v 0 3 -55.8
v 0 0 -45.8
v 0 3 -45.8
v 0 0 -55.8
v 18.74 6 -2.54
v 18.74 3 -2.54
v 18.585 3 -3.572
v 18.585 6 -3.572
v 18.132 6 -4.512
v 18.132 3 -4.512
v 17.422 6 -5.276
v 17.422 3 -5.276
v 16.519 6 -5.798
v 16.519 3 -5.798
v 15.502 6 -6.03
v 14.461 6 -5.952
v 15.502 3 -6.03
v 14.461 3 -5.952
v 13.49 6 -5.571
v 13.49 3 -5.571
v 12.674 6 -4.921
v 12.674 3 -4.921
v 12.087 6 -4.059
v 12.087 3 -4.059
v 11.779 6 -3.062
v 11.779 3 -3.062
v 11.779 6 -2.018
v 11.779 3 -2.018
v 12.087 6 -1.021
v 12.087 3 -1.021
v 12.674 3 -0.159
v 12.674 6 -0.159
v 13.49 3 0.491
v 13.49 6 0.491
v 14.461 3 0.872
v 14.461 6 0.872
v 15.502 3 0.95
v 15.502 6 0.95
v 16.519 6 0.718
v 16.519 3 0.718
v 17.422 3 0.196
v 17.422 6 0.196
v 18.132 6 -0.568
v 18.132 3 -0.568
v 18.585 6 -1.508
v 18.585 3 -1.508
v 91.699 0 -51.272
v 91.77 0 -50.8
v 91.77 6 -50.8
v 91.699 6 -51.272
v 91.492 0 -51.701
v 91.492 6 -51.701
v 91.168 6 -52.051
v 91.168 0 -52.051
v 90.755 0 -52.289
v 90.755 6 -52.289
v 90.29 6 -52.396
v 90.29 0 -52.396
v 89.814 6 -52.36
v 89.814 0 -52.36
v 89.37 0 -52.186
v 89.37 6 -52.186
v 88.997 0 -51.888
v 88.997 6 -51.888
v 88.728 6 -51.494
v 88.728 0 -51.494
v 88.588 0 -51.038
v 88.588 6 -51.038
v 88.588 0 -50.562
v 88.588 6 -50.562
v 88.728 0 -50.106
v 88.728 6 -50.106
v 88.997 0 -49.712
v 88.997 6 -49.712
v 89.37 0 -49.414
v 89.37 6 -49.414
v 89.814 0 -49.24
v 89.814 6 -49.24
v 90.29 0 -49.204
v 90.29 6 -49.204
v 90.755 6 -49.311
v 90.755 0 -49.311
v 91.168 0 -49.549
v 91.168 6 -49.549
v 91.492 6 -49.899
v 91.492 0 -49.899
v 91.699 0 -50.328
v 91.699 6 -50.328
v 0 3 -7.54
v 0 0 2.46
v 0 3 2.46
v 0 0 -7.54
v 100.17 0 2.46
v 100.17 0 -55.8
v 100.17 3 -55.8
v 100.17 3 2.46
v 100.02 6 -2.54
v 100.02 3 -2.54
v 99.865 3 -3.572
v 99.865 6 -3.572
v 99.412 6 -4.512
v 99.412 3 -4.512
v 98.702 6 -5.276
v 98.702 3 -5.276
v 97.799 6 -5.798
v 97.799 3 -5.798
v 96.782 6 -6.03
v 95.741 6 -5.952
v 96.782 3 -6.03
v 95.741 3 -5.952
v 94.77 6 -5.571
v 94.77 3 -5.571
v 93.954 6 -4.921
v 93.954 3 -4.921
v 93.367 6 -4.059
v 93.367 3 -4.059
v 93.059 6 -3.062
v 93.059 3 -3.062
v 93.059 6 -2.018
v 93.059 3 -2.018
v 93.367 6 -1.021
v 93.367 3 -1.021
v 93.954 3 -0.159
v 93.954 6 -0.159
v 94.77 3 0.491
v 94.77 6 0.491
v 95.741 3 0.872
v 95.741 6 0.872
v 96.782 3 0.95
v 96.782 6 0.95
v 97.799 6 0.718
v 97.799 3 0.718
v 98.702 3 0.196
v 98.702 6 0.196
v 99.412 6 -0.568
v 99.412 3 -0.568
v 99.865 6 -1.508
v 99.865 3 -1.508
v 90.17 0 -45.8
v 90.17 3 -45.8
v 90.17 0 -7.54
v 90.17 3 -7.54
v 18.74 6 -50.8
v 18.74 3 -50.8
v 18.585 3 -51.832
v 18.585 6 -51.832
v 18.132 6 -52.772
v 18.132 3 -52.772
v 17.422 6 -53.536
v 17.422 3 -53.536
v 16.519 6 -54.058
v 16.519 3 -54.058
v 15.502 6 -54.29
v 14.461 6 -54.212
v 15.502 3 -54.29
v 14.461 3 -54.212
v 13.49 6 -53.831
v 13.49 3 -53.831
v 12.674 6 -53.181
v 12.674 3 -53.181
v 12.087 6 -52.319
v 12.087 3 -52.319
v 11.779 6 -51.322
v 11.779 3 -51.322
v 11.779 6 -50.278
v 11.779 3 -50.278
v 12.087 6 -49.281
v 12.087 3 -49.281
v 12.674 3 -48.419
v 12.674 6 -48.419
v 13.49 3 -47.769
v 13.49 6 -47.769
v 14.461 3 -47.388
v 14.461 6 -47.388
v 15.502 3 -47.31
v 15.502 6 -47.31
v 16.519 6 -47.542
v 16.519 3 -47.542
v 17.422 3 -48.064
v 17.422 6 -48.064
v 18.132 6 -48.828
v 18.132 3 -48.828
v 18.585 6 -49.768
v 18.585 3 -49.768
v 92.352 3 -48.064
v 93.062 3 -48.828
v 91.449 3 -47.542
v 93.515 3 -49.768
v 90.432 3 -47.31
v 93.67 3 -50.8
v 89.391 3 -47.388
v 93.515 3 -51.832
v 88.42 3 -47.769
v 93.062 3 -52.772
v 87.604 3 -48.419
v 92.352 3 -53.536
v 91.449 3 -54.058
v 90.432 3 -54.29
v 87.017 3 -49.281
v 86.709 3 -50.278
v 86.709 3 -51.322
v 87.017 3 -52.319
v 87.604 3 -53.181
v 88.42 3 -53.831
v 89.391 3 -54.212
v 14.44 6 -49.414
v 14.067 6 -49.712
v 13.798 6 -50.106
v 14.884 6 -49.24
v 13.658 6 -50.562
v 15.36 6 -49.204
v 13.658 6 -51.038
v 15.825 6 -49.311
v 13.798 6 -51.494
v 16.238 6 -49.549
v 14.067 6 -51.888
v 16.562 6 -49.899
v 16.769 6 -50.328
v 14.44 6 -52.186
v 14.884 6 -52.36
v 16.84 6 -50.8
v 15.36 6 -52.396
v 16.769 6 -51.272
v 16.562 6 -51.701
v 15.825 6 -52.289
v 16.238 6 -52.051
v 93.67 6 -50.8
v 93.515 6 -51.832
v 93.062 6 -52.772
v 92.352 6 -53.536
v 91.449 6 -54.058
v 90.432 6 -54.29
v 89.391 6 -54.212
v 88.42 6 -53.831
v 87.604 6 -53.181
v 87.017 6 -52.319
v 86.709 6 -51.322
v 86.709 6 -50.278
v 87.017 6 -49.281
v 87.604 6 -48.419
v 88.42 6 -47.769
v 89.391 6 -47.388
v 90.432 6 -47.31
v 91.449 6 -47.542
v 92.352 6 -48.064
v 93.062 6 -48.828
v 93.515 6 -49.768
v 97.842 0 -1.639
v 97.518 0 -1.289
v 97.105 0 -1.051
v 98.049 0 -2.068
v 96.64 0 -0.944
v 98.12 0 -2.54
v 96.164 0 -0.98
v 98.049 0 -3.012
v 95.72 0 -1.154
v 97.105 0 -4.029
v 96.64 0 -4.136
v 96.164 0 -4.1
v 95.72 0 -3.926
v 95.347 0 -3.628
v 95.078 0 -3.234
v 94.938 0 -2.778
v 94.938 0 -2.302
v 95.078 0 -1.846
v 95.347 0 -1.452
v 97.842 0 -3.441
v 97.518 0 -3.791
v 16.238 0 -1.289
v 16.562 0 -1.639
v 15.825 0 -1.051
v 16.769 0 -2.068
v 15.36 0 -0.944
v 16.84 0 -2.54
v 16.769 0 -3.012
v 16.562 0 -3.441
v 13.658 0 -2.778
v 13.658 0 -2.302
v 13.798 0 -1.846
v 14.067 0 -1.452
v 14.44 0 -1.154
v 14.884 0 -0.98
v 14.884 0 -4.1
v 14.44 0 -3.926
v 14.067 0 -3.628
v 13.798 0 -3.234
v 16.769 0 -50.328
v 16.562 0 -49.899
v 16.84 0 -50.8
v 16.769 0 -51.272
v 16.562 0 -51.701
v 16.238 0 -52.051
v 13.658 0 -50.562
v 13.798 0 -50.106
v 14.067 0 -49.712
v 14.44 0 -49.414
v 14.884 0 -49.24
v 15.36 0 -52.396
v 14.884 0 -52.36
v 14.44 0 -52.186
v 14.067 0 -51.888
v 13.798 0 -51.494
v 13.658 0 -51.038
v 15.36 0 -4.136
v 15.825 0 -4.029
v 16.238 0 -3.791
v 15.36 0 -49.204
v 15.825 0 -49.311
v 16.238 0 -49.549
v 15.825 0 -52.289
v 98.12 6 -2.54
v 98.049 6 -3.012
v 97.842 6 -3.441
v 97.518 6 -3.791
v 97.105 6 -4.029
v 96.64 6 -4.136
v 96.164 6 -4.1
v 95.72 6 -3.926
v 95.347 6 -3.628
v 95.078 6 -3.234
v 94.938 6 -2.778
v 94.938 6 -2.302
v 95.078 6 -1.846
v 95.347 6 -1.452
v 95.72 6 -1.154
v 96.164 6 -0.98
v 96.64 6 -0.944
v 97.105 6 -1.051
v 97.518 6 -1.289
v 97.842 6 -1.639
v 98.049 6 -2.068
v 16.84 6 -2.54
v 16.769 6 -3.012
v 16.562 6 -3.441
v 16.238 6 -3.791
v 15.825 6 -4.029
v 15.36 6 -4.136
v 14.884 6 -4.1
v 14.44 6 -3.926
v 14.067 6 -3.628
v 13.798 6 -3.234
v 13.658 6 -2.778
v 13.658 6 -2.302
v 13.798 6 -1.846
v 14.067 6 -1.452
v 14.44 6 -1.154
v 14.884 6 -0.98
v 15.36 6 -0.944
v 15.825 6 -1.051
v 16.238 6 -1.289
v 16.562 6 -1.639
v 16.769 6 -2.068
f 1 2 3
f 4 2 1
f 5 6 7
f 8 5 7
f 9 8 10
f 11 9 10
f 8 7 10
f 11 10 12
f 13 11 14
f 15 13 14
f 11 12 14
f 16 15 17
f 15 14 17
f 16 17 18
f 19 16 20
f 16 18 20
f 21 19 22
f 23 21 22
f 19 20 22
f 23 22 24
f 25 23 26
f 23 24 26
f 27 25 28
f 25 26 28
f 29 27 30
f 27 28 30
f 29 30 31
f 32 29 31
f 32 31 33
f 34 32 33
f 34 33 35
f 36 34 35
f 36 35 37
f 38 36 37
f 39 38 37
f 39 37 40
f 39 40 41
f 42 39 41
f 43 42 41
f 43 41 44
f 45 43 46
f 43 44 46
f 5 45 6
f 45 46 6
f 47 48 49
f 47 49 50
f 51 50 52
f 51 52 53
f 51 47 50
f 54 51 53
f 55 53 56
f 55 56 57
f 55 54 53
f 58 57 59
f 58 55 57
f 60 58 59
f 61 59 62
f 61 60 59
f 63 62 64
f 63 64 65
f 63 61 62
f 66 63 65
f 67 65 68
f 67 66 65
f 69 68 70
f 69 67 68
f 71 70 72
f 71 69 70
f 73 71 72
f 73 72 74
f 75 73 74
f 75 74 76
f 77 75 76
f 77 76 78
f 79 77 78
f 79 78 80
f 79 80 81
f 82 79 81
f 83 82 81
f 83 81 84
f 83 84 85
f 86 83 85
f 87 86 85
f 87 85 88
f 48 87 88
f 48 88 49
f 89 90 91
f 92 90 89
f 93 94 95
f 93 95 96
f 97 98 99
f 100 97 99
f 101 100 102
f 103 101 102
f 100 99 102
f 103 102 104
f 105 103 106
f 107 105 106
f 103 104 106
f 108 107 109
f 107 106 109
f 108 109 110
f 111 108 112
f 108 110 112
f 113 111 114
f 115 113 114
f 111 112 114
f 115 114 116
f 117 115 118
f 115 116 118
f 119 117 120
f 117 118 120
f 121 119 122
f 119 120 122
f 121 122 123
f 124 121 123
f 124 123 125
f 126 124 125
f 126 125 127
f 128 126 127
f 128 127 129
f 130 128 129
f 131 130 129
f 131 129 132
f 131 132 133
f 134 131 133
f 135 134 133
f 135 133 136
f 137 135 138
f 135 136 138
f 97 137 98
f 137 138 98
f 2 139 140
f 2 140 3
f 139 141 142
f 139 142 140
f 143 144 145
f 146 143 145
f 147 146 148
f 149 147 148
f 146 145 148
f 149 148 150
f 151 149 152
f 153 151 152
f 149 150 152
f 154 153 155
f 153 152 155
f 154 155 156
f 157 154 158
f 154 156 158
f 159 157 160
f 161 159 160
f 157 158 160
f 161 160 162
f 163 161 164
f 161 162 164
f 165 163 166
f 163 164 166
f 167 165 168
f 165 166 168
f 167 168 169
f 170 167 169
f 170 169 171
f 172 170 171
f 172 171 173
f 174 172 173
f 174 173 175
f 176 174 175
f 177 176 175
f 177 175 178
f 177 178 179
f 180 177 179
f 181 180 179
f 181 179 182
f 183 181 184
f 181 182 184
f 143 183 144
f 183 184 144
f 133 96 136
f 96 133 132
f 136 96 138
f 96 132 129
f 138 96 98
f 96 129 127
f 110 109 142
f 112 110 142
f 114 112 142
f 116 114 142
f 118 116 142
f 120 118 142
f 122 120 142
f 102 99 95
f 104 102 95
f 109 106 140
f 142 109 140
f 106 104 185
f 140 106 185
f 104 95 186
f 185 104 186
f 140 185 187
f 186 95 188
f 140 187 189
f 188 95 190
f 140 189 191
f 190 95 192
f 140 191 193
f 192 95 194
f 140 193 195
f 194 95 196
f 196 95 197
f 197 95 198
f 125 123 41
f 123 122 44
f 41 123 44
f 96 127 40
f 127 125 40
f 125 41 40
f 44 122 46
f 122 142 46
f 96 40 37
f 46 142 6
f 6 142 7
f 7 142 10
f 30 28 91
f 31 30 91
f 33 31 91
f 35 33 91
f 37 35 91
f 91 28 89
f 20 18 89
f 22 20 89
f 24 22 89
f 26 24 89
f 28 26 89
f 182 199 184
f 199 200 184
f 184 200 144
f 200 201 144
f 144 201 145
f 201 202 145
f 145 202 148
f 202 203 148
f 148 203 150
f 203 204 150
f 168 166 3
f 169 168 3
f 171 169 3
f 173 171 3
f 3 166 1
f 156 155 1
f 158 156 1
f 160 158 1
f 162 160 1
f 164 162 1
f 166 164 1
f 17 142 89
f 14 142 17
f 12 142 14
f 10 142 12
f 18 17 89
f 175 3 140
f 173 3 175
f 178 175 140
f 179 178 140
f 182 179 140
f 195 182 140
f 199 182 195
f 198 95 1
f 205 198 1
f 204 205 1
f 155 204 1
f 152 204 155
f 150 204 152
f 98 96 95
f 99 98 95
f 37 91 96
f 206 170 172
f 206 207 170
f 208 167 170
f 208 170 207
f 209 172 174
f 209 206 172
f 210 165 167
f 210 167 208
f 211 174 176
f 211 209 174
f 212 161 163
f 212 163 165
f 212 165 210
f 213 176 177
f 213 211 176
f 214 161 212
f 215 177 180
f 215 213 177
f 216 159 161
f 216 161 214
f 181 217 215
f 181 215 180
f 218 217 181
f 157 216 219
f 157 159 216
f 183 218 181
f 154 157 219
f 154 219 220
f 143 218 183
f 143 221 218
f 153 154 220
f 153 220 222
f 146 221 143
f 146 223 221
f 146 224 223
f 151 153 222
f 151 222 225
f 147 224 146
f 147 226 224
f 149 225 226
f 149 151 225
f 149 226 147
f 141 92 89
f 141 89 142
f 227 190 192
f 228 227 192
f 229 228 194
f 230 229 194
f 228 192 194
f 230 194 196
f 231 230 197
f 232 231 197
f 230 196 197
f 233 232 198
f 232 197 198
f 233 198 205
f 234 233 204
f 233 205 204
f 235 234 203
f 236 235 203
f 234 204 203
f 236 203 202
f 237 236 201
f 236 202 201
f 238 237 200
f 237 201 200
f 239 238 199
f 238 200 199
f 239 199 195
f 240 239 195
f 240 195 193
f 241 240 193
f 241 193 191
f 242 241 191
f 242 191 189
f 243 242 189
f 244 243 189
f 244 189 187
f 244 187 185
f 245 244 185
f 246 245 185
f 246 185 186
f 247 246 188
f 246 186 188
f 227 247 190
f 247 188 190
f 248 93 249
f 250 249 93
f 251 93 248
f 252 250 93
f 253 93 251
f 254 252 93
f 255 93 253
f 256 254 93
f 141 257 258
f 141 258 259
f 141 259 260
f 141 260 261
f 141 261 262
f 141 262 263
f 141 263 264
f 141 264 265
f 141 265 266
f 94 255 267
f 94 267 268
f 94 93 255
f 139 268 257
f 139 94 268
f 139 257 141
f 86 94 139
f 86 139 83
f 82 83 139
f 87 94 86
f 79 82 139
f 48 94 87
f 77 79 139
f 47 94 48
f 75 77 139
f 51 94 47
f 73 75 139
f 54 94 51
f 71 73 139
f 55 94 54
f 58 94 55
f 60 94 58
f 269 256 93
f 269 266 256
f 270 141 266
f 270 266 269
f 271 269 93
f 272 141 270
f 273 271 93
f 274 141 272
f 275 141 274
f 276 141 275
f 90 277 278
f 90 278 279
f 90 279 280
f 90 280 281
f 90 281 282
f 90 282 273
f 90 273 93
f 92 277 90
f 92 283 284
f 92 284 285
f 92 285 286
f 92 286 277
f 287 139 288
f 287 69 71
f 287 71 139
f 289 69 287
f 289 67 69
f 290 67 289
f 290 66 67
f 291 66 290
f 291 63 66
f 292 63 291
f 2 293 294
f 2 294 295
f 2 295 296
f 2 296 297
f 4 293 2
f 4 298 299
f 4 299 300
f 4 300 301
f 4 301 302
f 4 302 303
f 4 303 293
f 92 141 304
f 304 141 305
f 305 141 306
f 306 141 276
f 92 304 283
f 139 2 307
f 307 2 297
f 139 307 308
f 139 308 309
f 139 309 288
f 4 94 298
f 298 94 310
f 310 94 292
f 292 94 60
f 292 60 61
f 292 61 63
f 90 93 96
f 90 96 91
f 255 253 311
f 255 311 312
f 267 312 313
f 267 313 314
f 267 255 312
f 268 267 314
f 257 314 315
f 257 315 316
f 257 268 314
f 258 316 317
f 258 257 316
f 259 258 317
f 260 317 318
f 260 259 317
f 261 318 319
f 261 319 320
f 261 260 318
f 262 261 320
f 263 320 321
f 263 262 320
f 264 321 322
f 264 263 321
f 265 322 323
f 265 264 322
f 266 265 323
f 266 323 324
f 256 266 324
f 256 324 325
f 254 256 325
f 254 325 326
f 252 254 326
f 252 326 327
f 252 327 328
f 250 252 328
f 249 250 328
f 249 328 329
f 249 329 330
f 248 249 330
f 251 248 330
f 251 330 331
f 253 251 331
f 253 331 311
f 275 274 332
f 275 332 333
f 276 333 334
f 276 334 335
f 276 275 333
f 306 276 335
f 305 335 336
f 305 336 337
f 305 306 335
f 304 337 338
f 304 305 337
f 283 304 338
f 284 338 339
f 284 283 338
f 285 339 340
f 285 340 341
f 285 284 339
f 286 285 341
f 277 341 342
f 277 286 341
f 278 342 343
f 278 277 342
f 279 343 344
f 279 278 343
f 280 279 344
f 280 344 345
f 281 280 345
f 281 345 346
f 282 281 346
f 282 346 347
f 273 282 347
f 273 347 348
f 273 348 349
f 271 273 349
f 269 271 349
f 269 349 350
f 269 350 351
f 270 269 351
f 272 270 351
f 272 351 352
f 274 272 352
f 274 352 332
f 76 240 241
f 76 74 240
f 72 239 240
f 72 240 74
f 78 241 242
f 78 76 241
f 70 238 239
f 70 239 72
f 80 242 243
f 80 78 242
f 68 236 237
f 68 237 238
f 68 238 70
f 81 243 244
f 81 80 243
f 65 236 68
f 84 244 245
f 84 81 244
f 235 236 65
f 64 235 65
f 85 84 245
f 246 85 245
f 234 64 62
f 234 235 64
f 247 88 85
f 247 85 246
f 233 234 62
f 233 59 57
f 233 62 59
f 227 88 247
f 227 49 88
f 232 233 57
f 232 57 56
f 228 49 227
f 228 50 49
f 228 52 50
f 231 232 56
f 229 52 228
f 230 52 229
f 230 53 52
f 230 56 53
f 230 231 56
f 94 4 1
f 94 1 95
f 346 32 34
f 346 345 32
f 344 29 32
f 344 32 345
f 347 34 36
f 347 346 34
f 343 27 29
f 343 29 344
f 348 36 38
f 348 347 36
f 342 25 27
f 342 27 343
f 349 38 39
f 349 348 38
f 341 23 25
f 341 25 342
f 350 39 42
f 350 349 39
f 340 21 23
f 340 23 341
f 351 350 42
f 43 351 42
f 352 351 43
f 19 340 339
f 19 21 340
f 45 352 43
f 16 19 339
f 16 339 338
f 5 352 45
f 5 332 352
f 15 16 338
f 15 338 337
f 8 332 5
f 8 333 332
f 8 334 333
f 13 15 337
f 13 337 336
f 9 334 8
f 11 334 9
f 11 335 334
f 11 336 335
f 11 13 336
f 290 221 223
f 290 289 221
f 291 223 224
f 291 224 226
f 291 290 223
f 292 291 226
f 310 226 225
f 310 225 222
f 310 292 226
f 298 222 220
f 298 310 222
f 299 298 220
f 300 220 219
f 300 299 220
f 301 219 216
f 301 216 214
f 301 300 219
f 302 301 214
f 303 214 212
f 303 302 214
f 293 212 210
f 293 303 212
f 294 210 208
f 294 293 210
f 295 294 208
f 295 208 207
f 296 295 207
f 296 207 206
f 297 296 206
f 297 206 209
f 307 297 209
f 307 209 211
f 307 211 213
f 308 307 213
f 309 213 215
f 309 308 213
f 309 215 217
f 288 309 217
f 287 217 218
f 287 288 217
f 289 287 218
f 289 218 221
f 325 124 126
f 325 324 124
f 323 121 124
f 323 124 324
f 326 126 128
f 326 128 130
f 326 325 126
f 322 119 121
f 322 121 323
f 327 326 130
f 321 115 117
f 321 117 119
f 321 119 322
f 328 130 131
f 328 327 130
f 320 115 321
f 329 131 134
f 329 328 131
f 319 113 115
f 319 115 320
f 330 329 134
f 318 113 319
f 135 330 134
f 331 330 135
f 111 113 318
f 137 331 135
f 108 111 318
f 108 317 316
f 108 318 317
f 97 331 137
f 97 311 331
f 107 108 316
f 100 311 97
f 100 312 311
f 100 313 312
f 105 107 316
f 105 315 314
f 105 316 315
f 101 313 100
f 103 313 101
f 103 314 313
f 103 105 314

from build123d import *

# Parameters (mm, degrees)
SKETCH1_R           = 1.6
BOSS_EXTRUDE1_DEPTH = 3
SKETCH2_R           = 3.5
SKETCH2_R_2         = 1.6
BOSS_EXTRUDE2_DEPTH = 3


with BuildPart() as part:
    # Sketch1 → Boss-Extrude1 (new body)
    with BuildSketch(Plane(origin=(0, 0, 0), x_dir=(1, 0, 0), z_dir=(0, 1, 0))):
        Polygon((0, 7.54), (90.17, 7.54), (90.17, 45.8), (0, 45.8), (0, 55.8), (100.17, 55.8), (100.17, -2.46), (0, -2.46), align=None)
        with Locations((15.24, 2.54)):
            Circle(SKETCH1_R, mode=Mode.SUBTRACT)
        with Locations((96.52, 2.54)):
            Circle(SKETCH1_R, mode=Mode.SUBTRACT)
        with Locations((15.24, 50.8)):
            Circle(SKETCH1_R, mode=Mode.SUBTRACT)
        with Locations((90.17, 50.8)):
            Circle(SKETCH1_R, mode=Mode.SUBTRACT)
    extrude(amount=BOSS_EXTRUDE1_DEPTH)

    # Sketch2 → Boss-Extrude2 (add)
    with BuildSketch(Plane(origin=(0, 3, 0), x_dir=(1, 0, 0), z_dir=(0, 1, 0))):
        with Locations((15.24, 50.8)):
            Circle(SKETCH2_R)
        with Locations((15.24, 50.8)):
            Circle(SKETCH2_R_2, mode=Mode.SUBTRACT)
        with Locations((90.17, 50.8)):
            Circle(SKETCH2_R)
        with Locations((90.17, 50.8)):
            Circle(SKETCH2_R_2, mode=Mode.SUBTRACT)
        with Locations((96.52, 2.54)):
            Circle(SKETCH2_R)
        with Locations((96.52, 2.54)):
            Circle(SKETCH2_R_2, mode=Mode.SUBTRACT)
        with Locations((15.24, 2.54)):
            Circle(SKETCH2_R)
        with Locations((15.24, 2.54)):
            Circle(SKETCH2_R_2, mode=Mode.SUBTRACT)
    extrude(amount=BOSS_EXTRUDE2_DEPTH)


solid = part.part
